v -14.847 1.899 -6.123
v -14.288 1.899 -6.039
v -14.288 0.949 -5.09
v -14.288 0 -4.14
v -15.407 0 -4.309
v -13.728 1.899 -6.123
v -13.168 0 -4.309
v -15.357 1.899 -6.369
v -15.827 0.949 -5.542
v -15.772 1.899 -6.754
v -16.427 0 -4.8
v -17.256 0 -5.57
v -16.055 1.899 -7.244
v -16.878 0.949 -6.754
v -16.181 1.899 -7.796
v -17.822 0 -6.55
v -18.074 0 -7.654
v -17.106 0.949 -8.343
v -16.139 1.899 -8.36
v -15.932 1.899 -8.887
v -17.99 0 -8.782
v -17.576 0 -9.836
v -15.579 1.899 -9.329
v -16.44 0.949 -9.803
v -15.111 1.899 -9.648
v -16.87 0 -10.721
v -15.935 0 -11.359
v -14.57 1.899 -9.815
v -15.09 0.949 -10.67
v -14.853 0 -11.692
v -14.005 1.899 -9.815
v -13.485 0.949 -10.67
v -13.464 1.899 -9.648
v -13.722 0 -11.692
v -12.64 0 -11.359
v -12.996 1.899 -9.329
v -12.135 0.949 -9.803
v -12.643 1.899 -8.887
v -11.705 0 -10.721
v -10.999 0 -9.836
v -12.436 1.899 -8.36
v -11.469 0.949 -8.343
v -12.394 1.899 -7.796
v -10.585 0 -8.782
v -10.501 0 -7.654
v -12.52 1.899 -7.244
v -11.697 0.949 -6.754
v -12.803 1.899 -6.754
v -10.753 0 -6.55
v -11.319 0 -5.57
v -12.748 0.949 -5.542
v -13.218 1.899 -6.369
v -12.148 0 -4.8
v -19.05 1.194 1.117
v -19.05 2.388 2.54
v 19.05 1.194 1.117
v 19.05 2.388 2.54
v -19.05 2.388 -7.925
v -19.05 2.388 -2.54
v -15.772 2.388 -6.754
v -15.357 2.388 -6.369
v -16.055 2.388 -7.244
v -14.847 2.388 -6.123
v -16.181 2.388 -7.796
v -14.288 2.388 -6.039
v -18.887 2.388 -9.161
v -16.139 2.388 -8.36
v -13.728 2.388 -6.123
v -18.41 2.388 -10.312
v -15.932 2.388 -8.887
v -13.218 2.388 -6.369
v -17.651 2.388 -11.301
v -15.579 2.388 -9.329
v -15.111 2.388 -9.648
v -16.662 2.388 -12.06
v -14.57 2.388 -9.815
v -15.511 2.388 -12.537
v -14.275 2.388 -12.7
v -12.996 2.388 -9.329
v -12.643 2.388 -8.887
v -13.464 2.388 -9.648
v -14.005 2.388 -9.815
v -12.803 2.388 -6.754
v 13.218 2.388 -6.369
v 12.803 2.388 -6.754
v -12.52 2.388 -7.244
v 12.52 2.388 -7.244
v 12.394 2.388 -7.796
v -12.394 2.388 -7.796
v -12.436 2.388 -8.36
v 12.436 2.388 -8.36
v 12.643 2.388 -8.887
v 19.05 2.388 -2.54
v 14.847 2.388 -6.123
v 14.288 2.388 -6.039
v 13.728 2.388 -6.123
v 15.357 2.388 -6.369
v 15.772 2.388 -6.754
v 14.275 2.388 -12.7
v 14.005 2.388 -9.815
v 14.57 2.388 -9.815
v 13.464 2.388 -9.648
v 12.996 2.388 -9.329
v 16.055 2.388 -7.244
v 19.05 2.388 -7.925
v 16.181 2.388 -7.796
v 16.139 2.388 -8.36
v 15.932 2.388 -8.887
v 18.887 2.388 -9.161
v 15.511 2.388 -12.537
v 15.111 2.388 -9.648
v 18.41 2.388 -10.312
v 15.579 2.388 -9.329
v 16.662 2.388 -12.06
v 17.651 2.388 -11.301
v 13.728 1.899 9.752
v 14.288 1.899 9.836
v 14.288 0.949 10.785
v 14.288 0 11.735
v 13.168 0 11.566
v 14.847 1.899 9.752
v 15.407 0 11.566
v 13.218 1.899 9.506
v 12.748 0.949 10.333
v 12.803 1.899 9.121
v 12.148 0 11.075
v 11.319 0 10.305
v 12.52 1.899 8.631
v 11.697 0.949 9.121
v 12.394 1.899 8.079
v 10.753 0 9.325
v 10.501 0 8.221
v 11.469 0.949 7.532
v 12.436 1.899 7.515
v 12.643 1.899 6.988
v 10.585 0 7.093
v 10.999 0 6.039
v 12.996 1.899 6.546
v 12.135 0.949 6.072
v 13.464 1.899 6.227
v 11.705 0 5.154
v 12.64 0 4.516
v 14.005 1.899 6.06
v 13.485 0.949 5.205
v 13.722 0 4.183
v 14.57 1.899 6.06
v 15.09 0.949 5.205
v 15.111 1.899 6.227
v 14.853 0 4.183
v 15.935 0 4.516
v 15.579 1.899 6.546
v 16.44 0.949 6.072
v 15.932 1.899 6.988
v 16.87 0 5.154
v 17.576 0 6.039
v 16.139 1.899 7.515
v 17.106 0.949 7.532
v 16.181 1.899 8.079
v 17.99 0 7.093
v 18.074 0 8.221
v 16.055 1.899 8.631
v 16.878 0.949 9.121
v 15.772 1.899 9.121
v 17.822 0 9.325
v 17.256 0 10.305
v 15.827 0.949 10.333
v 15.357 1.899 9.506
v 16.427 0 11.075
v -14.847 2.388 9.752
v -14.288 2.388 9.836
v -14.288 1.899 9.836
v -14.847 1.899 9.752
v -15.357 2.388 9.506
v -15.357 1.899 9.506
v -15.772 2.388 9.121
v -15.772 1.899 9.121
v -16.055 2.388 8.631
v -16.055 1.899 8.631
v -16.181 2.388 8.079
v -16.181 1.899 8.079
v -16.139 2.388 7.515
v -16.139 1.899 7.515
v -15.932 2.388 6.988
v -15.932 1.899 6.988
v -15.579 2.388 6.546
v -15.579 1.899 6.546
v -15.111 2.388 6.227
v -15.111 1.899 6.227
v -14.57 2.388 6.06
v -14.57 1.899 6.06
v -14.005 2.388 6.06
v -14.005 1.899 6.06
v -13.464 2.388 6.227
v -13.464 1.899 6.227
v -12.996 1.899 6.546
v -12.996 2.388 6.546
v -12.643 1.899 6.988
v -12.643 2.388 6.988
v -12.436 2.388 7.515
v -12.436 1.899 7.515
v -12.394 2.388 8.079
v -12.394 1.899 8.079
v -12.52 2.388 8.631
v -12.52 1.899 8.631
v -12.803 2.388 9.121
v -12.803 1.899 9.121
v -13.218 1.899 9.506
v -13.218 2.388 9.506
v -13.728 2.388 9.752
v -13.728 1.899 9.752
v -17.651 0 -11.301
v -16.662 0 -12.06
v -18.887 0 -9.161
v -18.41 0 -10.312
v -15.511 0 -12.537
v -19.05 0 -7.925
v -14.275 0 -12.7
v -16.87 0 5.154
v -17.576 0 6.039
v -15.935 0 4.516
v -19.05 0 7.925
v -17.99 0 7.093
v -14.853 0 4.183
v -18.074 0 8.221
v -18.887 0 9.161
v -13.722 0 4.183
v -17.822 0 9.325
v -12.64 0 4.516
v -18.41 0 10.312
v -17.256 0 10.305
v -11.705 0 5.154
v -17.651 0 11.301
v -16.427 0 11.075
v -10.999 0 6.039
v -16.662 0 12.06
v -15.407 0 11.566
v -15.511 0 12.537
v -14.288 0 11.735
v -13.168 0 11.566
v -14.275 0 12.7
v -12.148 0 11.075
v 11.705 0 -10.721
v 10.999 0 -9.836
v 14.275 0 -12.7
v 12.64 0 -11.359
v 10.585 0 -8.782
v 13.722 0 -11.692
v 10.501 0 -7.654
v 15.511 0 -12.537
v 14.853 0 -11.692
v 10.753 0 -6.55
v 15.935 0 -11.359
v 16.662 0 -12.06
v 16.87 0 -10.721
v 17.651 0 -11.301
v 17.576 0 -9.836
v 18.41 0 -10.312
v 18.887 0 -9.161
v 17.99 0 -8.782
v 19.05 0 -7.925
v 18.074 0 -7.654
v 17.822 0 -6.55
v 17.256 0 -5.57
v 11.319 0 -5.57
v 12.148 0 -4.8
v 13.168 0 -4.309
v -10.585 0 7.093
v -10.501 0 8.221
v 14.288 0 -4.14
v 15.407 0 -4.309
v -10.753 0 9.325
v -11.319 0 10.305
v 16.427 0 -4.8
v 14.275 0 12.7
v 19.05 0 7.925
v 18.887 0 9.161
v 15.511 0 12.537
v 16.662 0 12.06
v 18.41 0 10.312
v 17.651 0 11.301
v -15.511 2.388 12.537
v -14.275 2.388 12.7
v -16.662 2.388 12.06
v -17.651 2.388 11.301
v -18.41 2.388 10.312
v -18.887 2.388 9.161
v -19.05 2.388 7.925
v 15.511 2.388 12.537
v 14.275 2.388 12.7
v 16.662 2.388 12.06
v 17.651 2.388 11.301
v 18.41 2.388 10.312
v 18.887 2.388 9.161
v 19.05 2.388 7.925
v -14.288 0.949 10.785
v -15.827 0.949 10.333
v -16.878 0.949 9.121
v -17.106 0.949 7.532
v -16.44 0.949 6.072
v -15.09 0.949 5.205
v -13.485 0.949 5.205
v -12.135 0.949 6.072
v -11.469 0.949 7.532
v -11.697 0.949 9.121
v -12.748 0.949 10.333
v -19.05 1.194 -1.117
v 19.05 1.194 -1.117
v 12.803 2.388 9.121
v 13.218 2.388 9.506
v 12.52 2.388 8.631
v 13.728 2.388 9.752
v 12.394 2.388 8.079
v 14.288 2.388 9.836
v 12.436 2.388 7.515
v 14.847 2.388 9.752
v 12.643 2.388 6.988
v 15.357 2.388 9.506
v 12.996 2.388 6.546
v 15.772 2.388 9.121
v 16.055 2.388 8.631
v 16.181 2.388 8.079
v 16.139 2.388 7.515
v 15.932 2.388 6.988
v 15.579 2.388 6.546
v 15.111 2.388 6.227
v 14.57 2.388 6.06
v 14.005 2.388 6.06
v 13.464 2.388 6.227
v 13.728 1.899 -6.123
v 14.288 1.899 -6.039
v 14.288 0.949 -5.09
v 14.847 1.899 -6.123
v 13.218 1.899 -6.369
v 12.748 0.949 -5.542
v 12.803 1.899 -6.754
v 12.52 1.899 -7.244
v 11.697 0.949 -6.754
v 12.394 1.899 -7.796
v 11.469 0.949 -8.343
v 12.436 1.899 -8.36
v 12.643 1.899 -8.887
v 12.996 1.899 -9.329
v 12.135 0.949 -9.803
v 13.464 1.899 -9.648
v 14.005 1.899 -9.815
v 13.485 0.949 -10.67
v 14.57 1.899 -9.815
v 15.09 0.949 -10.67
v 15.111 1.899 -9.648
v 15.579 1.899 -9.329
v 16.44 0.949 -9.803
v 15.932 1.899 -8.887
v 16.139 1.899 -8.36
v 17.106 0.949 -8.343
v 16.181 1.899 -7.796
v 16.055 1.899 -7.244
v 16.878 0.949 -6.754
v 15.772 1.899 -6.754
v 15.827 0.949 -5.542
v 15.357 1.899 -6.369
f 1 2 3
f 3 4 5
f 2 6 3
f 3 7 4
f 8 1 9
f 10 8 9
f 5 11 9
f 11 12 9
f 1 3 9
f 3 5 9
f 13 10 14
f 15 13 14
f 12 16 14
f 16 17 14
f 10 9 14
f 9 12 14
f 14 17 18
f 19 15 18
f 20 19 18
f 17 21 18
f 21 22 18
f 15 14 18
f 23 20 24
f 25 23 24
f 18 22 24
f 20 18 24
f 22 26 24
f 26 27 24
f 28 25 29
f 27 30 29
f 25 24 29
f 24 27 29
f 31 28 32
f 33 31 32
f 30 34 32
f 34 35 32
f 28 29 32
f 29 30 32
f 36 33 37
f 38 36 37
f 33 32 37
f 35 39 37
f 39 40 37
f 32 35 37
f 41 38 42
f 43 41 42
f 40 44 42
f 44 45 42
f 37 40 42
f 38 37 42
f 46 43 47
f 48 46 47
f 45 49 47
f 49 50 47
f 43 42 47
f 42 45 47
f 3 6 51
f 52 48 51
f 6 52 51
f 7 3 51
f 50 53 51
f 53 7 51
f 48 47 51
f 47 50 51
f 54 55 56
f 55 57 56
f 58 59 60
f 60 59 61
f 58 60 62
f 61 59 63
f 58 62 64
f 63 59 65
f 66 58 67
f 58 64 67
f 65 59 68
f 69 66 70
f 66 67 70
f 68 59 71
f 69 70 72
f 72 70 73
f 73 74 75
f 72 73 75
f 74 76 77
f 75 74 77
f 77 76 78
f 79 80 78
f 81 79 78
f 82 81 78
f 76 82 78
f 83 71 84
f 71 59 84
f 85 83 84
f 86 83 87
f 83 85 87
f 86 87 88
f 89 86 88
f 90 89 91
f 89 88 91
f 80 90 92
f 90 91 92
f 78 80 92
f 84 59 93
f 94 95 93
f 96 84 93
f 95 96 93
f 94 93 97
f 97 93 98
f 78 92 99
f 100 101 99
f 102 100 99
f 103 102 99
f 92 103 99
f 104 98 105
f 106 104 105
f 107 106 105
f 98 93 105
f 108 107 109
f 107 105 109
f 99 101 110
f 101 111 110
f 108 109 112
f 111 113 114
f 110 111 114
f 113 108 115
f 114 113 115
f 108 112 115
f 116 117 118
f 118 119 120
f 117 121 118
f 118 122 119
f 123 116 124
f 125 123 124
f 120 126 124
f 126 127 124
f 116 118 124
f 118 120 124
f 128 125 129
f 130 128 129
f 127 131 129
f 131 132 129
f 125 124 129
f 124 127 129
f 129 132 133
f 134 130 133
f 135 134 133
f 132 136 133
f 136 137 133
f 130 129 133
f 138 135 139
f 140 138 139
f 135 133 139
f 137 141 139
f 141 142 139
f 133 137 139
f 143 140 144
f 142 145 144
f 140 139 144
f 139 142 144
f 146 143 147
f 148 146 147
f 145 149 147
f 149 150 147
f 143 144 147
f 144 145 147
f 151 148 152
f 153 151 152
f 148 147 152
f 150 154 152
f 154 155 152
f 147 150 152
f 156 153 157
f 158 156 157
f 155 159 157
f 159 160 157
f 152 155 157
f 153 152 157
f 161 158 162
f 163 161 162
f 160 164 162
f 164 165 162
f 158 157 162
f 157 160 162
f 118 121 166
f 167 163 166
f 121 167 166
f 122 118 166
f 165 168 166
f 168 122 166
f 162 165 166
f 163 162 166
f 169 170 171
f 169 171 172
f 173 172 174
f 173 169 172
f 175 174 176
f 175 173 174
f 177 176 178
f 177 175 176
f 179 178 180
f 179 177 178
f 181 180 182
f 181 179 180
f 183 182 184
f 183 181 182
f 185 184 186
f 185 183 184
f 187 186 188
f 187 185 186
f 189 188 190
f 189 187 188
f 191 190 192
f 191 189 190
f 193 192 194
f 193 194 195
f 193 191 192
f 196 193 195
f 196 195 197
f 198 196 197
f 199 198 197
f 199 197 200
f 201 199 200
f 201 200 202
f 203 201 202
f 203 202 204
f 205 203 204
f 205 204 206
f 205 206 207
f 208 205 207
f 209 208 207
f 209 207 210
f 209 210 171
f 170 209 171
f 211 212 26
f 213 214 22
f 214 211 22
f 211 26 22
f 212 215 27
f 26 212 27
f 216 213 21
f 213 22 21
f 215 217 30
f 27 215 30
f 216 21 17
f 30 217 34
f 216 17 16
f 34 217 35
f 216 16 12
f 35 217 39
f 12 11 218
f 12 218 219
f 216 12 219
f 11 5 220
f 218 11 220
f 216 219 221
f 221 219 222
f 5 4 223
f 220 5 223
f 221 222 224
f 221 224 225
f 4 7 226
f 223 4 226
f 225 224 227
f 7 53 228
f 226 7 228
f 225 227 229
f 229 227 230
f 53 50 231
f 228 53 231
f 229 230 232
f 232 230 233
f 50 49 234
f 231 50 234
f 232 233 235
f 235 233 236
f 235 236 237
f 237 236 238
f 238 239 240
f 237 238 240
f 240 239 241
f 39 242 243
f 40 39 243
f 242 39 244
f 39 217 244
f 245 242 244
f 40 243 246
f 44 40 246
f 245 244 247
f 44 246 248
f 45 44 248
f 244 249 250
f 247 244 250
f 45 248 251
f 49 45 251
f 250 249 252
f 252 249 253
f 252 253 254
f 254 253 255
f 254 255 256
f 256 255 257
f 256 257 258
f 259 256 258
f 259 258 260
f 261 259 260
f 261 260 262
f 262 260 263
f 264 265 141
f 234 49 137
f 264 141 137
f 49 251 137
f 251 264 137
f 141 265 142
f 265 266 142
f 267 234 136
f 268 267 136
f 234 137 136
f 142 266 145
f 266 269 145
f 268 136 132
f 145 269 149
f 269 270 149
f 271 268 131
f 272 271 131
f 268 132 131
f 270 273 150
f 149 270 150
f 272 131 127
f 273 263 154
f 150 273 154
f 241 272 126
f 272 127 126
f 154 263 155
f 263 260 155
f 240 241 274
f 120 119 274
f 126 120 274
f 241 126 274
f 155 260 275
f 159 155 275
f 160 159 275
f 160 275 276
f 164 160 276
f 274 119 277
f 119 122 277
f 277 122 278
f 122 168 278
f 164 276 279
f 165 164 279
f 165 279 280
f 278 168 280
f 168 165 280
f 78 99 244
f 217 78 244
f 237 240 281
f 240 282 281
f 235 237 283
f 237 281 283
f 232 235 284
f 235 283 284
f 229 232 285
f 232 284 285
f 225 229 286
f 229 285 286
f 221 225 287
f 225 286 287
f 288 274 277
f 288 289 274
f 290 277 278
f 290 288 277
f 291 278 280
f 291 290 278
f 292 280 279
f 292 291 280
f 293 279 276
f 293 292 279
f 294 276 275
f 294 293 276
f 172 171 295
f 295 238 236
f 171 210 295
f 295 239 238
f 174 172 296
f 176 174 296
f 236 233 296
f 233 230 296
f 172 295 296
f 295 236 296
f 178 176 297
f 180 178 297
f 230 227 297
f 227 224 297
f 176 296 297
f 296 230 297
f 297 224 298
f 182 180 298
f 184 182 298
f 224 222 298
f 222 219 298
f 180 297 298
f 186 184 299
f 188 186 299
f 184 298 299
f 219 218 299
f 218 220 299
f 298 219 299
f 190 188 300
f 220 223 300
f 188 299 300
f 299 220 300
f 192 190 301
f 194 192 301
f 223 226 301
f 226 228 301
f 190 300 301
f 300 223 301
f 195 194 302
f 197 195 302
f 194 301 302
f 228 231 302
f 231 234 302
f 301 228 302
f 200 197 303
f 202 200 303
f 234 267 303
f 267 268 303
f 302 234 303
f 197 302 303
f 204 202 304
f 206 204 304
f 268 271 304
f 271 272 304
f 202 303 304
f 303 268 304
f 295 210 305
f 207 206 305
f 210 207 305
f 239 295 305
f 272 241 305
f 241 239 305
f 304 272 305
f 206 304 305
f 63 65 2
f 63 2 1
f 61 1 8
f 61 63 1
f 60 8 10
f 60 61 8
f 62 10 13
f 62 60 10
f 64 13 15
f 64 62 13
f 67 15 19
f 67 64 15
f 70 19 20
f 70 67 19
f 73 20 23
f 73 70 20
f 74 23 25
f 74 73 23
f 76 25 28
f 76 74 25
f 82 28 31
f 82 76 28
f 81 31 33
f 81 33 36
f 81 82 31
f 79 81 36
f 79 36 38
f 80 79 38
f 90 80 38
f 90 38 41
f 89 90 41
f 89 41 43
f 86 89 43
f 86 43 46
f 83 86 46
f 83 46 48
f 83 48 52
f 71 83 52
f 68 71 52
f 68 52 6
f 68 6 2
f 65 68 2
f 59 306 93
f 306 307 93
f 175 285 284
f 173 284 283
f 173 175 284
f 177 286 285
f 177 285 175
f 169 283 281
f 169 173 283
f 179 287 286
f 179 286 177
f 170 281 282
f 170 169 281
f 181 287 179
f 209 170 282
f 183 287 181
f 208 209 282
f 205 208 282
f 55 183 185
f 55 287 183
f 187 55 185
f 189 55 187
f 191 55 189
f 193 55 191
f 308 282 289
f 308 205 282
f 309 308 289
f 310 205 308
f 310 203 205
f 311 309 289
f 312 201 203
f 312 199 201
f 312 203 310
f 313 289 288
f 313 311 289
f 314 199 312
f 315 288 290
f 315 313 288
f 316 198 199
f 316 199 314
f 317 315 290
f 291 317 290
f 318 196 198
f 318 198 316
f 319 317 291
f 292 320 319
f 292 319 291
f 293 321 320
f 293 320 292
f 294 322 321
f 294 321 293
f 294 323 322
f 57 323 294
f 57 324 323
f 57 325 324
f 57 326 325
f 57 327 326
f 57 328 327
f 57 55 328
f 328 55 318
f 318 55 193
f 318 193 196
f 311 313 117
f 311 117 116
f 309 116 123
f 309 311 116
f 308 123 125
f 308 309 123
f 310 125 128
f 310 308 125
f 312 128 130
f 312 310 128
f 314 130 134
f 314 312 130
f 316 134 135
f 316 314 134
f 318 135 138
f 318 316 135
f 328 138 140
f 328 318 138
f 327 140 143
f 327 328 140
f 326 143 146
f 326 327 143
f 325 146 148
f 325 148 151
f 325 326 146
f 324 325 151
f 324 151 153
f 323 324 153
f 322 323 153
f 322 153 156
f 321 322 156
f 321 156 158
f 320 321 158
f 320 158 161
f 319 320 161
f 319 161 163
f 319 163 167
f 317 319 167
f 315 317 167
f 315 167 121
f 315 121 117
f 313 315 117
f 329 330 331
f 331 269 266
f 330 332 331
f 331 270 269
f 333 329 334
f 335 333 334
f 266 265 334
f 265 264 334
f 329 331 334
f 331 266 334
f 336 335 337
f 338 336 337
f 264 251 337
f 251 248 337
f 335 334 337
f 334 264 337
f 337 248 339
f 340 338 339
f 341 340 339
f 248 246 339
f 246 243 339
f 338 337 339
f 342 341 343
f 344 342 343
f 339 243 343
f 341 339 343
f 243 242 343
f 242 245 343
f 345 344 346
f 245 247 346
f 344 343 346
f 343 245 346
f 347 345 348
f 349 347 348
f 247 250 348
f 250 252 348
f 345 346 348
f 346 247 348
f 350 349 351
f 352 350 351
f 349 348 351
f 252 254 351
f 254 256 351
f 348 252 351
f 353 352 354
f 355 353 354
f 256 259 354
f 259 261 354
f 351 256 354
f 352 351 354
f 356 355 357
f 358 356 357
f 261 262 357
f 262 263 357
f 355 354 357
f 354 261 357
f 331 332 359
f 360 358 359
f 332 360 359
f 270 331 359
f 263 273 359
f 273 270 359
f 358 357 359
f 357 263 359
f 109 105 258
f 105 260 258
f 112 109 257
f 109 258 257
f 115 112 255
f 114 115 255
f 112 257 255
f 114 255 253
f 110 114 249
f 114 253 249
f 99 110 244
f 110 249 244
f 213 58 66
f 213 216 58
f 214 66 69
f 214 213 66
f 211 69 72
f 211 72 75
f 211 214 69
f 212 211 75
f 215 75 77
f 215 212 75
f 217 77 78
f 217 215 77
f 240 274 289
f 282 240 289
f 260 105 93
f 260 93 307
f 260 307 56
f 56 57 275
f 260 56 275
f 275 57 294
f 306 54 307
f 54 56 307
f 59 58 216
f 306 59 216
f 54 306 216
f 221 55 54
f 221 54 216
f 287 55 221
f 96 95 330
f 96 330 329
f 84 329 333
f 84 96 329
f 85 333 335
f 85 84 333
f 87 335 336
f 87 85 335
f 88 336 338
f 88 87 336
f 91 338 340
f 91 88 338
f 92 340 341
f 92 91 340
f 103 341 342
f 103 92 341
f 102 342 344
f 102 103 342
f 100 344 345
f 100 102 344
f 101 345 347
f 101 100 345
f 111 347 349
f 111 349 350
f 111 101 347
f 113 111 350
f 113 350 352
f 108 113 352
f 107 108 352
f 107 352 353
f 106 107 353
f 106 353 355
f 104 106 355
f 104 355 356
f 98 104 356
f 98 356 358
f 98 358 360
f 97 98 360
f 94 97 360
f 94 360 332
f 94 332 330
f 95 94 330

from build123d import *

# Parameters (mm, degrees)
EXTRUDE1_DEPTH                                = 19.05
CSK_FOR_6_FLAT_HEAD_MACHINE_SCREW1_AT_2_COUNT = 2
CSK_FOR_6_FLAT_HEAD_MACHINE_SCREW1_AT_2_PITCH = 32.688625698
CSK_FOR_6_FLAT_HEAD_MACHINE_SCREW1_AT_3_COUNT = 2
CSK_FOR_6_FLAT_HEAD_MACHINE_SCREW1_AT_3_PITCH = 28.575
CSK_FOR_6_FLAT_HEAD_MACHINE_SCREW1_AT_4_COUNT = 2
CSK_FOR_6_FLAT_HEAD_MACHINE_SCREW1_AT_4_PITCH = 15.875
FILLET1_R                                     = 4.7752
SKETCH6_R                                     = 3.5433
SKETCH6_R_2                                   = 1.89865
BOSS_EXTRUDE1_DEPTH                           = 2.3876
CHAMFER1_SIZE                                 = 1.89865


with BuildPart() as part:
    # Sketch2 → Extrude1 (new, symmetric)
    with BuildSketch(Plane(origin=(0, 0, 0), x_dir=(0, 0, -1), z_dir=(1, 0, 0))):
        Polygon((-12.7, 2.3876), (-2.54, 2.3876), (-1.117284561, 1.1938), (1.117284561, 1.1938), (2.54, 2.3876), (12.7, 2.3876), (12.7, 0), (-12.7, 0), align=None)
    extrude(amount=EXTRUDE1_DEPTH, both=True)

    # Sketch5 → CSK for #6 Flat Head Machine Screw1 (revolve, cut)
    with BuildSketch(Plane(origin=(-14.2875, 2.3876, 7.9375), x_dir=(0, 0, 1), z_dir=(1, 0, 0))):
        Polygon((0, 0), (0, 2.3876), (1.89865, 2.3876), (1.89865, 1.891953401), (3.5433, 0), align=None)
    csk_for_6_flat_head_machine_screw1 = revolve(axis=Axis((-14.2875, 8.7376, 7.9375), (0, -1, 0)), mode=Mode.SUBTRACT)

    # CSK for #6 Flat Head Machine Screw1 at 2: CSK for #6 Flat Head Machine Screw1 ×2
    with Locations(*[Vector(0.8741572761215377, 0, -0.4856429311786321) * (i * CSK_FOR_6_FLAT_HEAD_MACHINE_SCREW1_AT_2_PITCH) for i in range(1, CSK_FOR_6_FLAT_HEAD_MACHINE_SCREW1_AT_2_COUNT)]):
        add(csk_for_6_flat_head_machine_screw1, mode=Mode.SUBTRACT)

    # CSK for #6 Flat Head Machine Screw1 at 3: CSK for #6 Flat Head Machine Screw1 ×2
    with Locations(*[(i * CSK_FOR_6_FLAT_HEAD_MACHINE_SCREW1_AT_3_PITCH, 0, 0) for i in range(1, CSK_FOR_6_FLAT_HEAD_MACHINE_SCREW1_AT_3_COUNT)]):
        add(csk_for_6_flat_head_machine_screw1, mode=Mode.SUBTRACT)

    # CSK for #6 Flat Head Machine Screw1 at 4: CSK for #6 Flat Head Machine Screw1 ×2
    with Locations(*[(0, 0, -i * CSK_FOR_6_FLAT_HEAD_MACHINE_SCREW1_AT_4_PITCH) for i in range(1, CSK_FOR_6_FLAT_HEAD_MACHINE_SCREW1_AT_4_COUNT)]):
        add(csk_for_6_flat_head_machine_screw1, mode=Mode.SUBTRACT)

    # Fillet1
    fillet1_edges = [part.edges().sort_by_distance(p)[0] for p in [
        (19.05, 1.1938, -12.7),
        (-19.05, 1.1938, 12.7),
        (19.05, 1.1938, 12.7),
        (-19.05, 1.1938, -12.7),
    ]]
    fillet(fillet1_edges, radius=FILLET1_R)

    # Sketch6 → Boss-Extrude1 (add)
    # profile 1 of 4: a face of its own
    with BuildSketch(Plane(origin=(0, 2.3876, 0), x_dir=(1, 0, 0), z_dir=(0, 1, 0))):
        with Locations((-14.2875, -7.9375)):
            Circle(SKETCH6_R)
        with Locations(Location((-14.2875, -7.9375, 0), (0, 0, 270))):
            Circle(SKETCH6_R_2, mode=Mode.SUBTRACT)
    # profile 2 of 4: a face of its own
    with BuildSketch(Plane(origin=(0, 2.3876, 0), x_dir=(1, 0, 0), z_dir=(0, 1, 0))):
        with Locations((-14.2875, 7.9375)):
            Circle(SKETCH6_R)
        with Locations(Location((-14.2875, 7.9375, 0), (0, 0, 270))):
            Circle(SKETCH6_R_2, mode=Mode.SUBTRACT)
    # profile 3 of 4: a face of its own
    with BuildSketch(Plane(origin=(0, 2.3876, 0), x_dir=(1, 0, 0), z_dir=(0, 1, 0))):
        with Locations((14.2875, -7.9375)):
            Circle(SKETCH6_R)
        with Locations(Location((14.2875, -7.9375, 0), (0, 0, 270))):
            Circle(SKETCH6_R_2, mode=Mode.SUBTRACT)
    # profile 4 of 4: a face of its own
    with BuildSketch(Plane(origin=(0, 2.3876, 0), x_dir=(1, 0, 0), z_dir=(0, 1, 0))):
        with Locations((14.2875, 7.9375)):
            Circle(SKETCH6_R)
        with Locations(Location((14.2875, 7.9375, 0), (0, 0, 270))):
            Circle(SKETCH6_R_2, mode=Mode.SUBTRACT)
    extrude(amount=-BOSS_EXTRUDE1_DEPTH)

    # Chamfer1
    chamfer1_edges = [part.edges().sort_by_distance(p)[0] for p in [
        (-14.2875, 0, -9.83615),
        (14.2875, 0, 6.03885),
        (14.2875, 0, -9.83615),
        (-14.2875, 0, 6.03885),
    ]]
    chamfer(chamfer1_edges, length=CHAMFER1_SIZE)


solid = part.part
